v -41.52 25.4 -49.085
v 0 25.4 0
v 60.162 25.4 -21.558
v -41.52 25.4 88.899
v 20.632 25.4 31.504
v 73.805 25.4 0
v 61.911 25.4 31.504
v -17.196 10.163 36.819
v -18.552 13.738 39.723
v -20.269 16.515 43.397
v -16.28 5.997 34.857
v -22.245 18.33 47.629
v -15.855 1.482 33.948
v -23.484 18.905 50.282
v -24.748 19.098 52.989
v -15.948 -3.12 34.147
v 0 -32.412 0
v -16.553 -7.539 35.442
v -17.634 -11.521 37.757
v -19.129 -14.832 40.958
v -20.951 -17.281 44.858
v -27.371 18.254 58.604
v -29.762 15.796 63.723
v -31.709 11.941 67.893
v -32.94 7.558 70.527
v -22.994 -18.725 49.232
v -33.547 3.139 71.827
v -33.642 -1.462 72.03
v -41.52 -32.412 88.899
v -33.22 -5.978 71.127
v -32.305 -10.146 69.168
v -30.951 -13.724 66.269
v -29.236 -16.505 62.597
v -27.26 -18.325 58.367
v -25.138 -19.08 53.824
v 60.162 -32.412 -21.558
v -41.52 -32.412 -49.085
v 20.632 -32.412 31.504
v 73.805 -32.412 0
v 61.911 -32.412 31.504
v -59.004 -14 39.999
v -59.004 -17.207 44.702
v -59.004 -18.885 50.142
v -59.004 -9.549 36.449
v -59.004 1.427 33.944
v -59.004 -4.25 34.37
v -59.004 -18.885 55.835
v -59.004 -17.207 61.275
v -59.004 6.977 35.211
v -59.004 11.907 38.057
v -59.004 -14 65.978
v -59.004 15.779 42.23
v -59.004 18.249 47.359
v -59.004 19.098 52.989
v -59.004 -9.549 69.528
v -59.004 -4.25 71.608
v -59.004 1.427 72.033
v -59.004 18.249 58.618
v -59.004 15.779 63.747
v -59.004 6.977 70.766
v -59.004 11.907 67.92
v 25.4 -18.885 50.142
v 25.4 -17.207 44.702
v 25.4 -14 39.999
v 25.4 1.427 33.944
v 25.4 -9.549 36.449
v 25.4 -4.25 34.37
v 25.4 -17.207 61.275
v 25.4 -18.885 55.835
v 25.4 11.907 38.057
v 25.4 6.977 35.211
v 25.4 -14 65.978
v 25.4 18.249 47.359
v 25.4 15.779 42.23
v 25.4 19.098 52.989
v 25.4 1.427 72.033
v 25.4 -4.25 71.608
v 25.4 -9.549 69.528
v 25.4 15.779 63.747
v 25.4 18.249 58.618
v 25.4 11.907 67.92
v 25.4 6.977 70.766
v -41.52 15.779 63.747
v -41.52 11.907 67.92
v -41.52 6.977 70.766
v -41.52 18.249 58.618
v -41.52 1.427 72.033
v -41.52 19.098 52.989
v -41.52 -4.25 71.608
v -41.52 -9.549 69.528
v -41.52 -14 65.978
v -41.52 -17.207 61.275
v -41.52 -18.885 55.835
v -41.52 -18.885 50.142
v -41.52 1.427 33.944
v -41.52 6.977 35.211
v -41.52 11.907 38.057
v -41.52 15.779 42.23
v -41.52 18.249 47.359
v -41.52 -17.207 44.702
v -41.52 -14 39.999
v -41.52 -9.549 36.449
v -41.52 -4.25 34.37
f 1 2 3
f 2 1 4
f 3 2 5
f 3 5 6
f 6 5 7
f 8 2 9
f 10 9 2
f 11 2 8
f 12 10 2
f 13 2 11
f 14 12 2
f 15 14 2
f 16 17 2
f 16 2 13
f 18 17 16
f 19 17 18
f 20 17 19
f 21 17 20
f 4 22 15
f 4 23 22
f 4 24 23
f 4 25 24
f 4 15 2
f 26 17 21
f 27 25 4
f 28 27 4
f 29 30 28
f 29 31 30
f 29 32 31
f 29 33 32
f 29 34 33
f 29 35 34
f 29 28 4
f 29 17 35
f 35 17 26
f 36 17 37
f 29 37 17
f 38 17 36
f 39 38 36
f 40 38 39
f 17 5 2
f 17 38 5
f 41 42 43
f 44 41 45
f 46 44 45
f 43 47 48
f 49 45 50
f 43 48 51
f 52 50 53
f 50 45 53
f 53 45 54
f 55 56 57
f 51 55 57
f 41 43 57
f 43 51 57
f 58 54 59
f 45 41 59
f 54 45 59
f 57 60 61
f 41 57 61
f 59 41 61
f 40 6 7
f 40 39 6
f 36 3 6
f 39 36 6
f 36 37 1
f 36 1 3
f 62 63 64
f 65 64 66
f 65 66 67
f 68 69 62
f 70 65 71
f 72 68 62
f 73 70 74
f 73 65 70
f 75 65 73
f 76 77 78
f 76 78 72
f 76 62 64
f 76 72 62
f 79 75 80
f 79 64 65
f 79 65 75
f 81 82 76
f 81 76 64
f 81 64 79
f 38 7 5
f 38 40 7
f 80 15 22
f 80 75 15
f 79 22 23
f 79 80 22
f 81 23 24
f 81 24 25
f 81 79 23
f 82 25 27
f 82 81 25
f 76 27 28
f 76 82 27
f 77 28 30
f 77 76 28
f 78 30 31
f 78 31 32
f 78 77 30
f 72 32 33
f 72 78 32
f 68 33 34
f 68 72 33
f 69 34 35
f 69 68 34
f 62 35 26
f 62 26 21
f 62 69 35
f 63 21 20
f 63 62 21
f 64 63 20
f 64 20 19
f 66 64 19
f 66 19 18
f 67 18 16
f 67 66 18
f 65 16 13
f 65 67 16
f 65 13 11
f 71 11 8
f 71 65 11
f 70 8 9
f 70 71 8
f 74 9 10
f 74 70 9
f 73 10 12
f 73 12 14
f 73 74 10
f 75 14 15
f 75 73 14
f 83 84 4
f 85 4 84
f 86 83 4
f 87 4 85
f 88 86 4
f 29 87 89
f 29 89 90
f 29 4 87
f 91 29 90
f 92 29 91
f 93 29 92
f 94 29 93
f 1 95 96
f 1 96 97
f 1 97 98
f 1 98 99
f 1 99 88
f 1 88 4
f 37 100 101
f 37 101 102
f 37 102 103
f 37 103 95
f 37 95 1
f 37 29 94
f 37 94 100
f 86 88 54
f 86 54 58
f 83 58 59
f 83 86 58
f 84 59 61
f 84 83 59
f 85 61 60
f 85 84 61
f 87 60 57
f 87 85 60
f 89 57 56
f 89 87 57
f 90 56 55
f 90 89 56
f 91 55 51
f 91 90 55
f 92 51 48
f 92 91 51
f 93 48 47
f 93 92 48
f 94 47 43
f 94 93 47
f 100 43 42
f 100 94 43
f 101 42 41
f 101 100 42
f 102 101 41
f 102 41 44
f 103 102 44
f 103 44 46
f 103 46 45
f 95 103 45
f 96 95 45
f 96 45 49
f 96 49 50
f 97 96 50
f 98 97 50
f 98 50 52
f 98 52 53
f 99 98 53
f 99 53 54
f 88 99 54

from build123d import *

# Parameters (mm, degrees)
F2_DEPTH      = 32.412255
F2_DEPTH_BACK = 25.4
F1_R          = 19.097842
F3_DEPTH      = 25.4
F3_DEPTH_BACK = 59.003653


with BuildPart() as f2:
    # F0 (on Front) → F2 (new body, two sides)
    with BuildSketch(Plane.XZ) as f2_sk:
        Polygon((20.631641, 31.503856), (0, 0), (-41.520298, 88.899463), (-41.520298, -49.084738), (60.161673, -21.557882), (73.804773, 0), (61.910786, 31.503856), align=None)
    extrude(amount=F2_DEPTH)
    extrude(f2_sk.sketch, amount=-F2_DEPTH_BACK)

    # F1 (on Right) → F3 (join, two sides)
    with BuildSketch(Plane.YZ) as f3_sk:
        with Locations((0, 52.988626)):
            Circle(F1_R)
    extrude(amount=F3_DEPTH)
    extrude(f3_sk.sketch, amount=-F3_DEPTH_BACK)


solid = f2.part
